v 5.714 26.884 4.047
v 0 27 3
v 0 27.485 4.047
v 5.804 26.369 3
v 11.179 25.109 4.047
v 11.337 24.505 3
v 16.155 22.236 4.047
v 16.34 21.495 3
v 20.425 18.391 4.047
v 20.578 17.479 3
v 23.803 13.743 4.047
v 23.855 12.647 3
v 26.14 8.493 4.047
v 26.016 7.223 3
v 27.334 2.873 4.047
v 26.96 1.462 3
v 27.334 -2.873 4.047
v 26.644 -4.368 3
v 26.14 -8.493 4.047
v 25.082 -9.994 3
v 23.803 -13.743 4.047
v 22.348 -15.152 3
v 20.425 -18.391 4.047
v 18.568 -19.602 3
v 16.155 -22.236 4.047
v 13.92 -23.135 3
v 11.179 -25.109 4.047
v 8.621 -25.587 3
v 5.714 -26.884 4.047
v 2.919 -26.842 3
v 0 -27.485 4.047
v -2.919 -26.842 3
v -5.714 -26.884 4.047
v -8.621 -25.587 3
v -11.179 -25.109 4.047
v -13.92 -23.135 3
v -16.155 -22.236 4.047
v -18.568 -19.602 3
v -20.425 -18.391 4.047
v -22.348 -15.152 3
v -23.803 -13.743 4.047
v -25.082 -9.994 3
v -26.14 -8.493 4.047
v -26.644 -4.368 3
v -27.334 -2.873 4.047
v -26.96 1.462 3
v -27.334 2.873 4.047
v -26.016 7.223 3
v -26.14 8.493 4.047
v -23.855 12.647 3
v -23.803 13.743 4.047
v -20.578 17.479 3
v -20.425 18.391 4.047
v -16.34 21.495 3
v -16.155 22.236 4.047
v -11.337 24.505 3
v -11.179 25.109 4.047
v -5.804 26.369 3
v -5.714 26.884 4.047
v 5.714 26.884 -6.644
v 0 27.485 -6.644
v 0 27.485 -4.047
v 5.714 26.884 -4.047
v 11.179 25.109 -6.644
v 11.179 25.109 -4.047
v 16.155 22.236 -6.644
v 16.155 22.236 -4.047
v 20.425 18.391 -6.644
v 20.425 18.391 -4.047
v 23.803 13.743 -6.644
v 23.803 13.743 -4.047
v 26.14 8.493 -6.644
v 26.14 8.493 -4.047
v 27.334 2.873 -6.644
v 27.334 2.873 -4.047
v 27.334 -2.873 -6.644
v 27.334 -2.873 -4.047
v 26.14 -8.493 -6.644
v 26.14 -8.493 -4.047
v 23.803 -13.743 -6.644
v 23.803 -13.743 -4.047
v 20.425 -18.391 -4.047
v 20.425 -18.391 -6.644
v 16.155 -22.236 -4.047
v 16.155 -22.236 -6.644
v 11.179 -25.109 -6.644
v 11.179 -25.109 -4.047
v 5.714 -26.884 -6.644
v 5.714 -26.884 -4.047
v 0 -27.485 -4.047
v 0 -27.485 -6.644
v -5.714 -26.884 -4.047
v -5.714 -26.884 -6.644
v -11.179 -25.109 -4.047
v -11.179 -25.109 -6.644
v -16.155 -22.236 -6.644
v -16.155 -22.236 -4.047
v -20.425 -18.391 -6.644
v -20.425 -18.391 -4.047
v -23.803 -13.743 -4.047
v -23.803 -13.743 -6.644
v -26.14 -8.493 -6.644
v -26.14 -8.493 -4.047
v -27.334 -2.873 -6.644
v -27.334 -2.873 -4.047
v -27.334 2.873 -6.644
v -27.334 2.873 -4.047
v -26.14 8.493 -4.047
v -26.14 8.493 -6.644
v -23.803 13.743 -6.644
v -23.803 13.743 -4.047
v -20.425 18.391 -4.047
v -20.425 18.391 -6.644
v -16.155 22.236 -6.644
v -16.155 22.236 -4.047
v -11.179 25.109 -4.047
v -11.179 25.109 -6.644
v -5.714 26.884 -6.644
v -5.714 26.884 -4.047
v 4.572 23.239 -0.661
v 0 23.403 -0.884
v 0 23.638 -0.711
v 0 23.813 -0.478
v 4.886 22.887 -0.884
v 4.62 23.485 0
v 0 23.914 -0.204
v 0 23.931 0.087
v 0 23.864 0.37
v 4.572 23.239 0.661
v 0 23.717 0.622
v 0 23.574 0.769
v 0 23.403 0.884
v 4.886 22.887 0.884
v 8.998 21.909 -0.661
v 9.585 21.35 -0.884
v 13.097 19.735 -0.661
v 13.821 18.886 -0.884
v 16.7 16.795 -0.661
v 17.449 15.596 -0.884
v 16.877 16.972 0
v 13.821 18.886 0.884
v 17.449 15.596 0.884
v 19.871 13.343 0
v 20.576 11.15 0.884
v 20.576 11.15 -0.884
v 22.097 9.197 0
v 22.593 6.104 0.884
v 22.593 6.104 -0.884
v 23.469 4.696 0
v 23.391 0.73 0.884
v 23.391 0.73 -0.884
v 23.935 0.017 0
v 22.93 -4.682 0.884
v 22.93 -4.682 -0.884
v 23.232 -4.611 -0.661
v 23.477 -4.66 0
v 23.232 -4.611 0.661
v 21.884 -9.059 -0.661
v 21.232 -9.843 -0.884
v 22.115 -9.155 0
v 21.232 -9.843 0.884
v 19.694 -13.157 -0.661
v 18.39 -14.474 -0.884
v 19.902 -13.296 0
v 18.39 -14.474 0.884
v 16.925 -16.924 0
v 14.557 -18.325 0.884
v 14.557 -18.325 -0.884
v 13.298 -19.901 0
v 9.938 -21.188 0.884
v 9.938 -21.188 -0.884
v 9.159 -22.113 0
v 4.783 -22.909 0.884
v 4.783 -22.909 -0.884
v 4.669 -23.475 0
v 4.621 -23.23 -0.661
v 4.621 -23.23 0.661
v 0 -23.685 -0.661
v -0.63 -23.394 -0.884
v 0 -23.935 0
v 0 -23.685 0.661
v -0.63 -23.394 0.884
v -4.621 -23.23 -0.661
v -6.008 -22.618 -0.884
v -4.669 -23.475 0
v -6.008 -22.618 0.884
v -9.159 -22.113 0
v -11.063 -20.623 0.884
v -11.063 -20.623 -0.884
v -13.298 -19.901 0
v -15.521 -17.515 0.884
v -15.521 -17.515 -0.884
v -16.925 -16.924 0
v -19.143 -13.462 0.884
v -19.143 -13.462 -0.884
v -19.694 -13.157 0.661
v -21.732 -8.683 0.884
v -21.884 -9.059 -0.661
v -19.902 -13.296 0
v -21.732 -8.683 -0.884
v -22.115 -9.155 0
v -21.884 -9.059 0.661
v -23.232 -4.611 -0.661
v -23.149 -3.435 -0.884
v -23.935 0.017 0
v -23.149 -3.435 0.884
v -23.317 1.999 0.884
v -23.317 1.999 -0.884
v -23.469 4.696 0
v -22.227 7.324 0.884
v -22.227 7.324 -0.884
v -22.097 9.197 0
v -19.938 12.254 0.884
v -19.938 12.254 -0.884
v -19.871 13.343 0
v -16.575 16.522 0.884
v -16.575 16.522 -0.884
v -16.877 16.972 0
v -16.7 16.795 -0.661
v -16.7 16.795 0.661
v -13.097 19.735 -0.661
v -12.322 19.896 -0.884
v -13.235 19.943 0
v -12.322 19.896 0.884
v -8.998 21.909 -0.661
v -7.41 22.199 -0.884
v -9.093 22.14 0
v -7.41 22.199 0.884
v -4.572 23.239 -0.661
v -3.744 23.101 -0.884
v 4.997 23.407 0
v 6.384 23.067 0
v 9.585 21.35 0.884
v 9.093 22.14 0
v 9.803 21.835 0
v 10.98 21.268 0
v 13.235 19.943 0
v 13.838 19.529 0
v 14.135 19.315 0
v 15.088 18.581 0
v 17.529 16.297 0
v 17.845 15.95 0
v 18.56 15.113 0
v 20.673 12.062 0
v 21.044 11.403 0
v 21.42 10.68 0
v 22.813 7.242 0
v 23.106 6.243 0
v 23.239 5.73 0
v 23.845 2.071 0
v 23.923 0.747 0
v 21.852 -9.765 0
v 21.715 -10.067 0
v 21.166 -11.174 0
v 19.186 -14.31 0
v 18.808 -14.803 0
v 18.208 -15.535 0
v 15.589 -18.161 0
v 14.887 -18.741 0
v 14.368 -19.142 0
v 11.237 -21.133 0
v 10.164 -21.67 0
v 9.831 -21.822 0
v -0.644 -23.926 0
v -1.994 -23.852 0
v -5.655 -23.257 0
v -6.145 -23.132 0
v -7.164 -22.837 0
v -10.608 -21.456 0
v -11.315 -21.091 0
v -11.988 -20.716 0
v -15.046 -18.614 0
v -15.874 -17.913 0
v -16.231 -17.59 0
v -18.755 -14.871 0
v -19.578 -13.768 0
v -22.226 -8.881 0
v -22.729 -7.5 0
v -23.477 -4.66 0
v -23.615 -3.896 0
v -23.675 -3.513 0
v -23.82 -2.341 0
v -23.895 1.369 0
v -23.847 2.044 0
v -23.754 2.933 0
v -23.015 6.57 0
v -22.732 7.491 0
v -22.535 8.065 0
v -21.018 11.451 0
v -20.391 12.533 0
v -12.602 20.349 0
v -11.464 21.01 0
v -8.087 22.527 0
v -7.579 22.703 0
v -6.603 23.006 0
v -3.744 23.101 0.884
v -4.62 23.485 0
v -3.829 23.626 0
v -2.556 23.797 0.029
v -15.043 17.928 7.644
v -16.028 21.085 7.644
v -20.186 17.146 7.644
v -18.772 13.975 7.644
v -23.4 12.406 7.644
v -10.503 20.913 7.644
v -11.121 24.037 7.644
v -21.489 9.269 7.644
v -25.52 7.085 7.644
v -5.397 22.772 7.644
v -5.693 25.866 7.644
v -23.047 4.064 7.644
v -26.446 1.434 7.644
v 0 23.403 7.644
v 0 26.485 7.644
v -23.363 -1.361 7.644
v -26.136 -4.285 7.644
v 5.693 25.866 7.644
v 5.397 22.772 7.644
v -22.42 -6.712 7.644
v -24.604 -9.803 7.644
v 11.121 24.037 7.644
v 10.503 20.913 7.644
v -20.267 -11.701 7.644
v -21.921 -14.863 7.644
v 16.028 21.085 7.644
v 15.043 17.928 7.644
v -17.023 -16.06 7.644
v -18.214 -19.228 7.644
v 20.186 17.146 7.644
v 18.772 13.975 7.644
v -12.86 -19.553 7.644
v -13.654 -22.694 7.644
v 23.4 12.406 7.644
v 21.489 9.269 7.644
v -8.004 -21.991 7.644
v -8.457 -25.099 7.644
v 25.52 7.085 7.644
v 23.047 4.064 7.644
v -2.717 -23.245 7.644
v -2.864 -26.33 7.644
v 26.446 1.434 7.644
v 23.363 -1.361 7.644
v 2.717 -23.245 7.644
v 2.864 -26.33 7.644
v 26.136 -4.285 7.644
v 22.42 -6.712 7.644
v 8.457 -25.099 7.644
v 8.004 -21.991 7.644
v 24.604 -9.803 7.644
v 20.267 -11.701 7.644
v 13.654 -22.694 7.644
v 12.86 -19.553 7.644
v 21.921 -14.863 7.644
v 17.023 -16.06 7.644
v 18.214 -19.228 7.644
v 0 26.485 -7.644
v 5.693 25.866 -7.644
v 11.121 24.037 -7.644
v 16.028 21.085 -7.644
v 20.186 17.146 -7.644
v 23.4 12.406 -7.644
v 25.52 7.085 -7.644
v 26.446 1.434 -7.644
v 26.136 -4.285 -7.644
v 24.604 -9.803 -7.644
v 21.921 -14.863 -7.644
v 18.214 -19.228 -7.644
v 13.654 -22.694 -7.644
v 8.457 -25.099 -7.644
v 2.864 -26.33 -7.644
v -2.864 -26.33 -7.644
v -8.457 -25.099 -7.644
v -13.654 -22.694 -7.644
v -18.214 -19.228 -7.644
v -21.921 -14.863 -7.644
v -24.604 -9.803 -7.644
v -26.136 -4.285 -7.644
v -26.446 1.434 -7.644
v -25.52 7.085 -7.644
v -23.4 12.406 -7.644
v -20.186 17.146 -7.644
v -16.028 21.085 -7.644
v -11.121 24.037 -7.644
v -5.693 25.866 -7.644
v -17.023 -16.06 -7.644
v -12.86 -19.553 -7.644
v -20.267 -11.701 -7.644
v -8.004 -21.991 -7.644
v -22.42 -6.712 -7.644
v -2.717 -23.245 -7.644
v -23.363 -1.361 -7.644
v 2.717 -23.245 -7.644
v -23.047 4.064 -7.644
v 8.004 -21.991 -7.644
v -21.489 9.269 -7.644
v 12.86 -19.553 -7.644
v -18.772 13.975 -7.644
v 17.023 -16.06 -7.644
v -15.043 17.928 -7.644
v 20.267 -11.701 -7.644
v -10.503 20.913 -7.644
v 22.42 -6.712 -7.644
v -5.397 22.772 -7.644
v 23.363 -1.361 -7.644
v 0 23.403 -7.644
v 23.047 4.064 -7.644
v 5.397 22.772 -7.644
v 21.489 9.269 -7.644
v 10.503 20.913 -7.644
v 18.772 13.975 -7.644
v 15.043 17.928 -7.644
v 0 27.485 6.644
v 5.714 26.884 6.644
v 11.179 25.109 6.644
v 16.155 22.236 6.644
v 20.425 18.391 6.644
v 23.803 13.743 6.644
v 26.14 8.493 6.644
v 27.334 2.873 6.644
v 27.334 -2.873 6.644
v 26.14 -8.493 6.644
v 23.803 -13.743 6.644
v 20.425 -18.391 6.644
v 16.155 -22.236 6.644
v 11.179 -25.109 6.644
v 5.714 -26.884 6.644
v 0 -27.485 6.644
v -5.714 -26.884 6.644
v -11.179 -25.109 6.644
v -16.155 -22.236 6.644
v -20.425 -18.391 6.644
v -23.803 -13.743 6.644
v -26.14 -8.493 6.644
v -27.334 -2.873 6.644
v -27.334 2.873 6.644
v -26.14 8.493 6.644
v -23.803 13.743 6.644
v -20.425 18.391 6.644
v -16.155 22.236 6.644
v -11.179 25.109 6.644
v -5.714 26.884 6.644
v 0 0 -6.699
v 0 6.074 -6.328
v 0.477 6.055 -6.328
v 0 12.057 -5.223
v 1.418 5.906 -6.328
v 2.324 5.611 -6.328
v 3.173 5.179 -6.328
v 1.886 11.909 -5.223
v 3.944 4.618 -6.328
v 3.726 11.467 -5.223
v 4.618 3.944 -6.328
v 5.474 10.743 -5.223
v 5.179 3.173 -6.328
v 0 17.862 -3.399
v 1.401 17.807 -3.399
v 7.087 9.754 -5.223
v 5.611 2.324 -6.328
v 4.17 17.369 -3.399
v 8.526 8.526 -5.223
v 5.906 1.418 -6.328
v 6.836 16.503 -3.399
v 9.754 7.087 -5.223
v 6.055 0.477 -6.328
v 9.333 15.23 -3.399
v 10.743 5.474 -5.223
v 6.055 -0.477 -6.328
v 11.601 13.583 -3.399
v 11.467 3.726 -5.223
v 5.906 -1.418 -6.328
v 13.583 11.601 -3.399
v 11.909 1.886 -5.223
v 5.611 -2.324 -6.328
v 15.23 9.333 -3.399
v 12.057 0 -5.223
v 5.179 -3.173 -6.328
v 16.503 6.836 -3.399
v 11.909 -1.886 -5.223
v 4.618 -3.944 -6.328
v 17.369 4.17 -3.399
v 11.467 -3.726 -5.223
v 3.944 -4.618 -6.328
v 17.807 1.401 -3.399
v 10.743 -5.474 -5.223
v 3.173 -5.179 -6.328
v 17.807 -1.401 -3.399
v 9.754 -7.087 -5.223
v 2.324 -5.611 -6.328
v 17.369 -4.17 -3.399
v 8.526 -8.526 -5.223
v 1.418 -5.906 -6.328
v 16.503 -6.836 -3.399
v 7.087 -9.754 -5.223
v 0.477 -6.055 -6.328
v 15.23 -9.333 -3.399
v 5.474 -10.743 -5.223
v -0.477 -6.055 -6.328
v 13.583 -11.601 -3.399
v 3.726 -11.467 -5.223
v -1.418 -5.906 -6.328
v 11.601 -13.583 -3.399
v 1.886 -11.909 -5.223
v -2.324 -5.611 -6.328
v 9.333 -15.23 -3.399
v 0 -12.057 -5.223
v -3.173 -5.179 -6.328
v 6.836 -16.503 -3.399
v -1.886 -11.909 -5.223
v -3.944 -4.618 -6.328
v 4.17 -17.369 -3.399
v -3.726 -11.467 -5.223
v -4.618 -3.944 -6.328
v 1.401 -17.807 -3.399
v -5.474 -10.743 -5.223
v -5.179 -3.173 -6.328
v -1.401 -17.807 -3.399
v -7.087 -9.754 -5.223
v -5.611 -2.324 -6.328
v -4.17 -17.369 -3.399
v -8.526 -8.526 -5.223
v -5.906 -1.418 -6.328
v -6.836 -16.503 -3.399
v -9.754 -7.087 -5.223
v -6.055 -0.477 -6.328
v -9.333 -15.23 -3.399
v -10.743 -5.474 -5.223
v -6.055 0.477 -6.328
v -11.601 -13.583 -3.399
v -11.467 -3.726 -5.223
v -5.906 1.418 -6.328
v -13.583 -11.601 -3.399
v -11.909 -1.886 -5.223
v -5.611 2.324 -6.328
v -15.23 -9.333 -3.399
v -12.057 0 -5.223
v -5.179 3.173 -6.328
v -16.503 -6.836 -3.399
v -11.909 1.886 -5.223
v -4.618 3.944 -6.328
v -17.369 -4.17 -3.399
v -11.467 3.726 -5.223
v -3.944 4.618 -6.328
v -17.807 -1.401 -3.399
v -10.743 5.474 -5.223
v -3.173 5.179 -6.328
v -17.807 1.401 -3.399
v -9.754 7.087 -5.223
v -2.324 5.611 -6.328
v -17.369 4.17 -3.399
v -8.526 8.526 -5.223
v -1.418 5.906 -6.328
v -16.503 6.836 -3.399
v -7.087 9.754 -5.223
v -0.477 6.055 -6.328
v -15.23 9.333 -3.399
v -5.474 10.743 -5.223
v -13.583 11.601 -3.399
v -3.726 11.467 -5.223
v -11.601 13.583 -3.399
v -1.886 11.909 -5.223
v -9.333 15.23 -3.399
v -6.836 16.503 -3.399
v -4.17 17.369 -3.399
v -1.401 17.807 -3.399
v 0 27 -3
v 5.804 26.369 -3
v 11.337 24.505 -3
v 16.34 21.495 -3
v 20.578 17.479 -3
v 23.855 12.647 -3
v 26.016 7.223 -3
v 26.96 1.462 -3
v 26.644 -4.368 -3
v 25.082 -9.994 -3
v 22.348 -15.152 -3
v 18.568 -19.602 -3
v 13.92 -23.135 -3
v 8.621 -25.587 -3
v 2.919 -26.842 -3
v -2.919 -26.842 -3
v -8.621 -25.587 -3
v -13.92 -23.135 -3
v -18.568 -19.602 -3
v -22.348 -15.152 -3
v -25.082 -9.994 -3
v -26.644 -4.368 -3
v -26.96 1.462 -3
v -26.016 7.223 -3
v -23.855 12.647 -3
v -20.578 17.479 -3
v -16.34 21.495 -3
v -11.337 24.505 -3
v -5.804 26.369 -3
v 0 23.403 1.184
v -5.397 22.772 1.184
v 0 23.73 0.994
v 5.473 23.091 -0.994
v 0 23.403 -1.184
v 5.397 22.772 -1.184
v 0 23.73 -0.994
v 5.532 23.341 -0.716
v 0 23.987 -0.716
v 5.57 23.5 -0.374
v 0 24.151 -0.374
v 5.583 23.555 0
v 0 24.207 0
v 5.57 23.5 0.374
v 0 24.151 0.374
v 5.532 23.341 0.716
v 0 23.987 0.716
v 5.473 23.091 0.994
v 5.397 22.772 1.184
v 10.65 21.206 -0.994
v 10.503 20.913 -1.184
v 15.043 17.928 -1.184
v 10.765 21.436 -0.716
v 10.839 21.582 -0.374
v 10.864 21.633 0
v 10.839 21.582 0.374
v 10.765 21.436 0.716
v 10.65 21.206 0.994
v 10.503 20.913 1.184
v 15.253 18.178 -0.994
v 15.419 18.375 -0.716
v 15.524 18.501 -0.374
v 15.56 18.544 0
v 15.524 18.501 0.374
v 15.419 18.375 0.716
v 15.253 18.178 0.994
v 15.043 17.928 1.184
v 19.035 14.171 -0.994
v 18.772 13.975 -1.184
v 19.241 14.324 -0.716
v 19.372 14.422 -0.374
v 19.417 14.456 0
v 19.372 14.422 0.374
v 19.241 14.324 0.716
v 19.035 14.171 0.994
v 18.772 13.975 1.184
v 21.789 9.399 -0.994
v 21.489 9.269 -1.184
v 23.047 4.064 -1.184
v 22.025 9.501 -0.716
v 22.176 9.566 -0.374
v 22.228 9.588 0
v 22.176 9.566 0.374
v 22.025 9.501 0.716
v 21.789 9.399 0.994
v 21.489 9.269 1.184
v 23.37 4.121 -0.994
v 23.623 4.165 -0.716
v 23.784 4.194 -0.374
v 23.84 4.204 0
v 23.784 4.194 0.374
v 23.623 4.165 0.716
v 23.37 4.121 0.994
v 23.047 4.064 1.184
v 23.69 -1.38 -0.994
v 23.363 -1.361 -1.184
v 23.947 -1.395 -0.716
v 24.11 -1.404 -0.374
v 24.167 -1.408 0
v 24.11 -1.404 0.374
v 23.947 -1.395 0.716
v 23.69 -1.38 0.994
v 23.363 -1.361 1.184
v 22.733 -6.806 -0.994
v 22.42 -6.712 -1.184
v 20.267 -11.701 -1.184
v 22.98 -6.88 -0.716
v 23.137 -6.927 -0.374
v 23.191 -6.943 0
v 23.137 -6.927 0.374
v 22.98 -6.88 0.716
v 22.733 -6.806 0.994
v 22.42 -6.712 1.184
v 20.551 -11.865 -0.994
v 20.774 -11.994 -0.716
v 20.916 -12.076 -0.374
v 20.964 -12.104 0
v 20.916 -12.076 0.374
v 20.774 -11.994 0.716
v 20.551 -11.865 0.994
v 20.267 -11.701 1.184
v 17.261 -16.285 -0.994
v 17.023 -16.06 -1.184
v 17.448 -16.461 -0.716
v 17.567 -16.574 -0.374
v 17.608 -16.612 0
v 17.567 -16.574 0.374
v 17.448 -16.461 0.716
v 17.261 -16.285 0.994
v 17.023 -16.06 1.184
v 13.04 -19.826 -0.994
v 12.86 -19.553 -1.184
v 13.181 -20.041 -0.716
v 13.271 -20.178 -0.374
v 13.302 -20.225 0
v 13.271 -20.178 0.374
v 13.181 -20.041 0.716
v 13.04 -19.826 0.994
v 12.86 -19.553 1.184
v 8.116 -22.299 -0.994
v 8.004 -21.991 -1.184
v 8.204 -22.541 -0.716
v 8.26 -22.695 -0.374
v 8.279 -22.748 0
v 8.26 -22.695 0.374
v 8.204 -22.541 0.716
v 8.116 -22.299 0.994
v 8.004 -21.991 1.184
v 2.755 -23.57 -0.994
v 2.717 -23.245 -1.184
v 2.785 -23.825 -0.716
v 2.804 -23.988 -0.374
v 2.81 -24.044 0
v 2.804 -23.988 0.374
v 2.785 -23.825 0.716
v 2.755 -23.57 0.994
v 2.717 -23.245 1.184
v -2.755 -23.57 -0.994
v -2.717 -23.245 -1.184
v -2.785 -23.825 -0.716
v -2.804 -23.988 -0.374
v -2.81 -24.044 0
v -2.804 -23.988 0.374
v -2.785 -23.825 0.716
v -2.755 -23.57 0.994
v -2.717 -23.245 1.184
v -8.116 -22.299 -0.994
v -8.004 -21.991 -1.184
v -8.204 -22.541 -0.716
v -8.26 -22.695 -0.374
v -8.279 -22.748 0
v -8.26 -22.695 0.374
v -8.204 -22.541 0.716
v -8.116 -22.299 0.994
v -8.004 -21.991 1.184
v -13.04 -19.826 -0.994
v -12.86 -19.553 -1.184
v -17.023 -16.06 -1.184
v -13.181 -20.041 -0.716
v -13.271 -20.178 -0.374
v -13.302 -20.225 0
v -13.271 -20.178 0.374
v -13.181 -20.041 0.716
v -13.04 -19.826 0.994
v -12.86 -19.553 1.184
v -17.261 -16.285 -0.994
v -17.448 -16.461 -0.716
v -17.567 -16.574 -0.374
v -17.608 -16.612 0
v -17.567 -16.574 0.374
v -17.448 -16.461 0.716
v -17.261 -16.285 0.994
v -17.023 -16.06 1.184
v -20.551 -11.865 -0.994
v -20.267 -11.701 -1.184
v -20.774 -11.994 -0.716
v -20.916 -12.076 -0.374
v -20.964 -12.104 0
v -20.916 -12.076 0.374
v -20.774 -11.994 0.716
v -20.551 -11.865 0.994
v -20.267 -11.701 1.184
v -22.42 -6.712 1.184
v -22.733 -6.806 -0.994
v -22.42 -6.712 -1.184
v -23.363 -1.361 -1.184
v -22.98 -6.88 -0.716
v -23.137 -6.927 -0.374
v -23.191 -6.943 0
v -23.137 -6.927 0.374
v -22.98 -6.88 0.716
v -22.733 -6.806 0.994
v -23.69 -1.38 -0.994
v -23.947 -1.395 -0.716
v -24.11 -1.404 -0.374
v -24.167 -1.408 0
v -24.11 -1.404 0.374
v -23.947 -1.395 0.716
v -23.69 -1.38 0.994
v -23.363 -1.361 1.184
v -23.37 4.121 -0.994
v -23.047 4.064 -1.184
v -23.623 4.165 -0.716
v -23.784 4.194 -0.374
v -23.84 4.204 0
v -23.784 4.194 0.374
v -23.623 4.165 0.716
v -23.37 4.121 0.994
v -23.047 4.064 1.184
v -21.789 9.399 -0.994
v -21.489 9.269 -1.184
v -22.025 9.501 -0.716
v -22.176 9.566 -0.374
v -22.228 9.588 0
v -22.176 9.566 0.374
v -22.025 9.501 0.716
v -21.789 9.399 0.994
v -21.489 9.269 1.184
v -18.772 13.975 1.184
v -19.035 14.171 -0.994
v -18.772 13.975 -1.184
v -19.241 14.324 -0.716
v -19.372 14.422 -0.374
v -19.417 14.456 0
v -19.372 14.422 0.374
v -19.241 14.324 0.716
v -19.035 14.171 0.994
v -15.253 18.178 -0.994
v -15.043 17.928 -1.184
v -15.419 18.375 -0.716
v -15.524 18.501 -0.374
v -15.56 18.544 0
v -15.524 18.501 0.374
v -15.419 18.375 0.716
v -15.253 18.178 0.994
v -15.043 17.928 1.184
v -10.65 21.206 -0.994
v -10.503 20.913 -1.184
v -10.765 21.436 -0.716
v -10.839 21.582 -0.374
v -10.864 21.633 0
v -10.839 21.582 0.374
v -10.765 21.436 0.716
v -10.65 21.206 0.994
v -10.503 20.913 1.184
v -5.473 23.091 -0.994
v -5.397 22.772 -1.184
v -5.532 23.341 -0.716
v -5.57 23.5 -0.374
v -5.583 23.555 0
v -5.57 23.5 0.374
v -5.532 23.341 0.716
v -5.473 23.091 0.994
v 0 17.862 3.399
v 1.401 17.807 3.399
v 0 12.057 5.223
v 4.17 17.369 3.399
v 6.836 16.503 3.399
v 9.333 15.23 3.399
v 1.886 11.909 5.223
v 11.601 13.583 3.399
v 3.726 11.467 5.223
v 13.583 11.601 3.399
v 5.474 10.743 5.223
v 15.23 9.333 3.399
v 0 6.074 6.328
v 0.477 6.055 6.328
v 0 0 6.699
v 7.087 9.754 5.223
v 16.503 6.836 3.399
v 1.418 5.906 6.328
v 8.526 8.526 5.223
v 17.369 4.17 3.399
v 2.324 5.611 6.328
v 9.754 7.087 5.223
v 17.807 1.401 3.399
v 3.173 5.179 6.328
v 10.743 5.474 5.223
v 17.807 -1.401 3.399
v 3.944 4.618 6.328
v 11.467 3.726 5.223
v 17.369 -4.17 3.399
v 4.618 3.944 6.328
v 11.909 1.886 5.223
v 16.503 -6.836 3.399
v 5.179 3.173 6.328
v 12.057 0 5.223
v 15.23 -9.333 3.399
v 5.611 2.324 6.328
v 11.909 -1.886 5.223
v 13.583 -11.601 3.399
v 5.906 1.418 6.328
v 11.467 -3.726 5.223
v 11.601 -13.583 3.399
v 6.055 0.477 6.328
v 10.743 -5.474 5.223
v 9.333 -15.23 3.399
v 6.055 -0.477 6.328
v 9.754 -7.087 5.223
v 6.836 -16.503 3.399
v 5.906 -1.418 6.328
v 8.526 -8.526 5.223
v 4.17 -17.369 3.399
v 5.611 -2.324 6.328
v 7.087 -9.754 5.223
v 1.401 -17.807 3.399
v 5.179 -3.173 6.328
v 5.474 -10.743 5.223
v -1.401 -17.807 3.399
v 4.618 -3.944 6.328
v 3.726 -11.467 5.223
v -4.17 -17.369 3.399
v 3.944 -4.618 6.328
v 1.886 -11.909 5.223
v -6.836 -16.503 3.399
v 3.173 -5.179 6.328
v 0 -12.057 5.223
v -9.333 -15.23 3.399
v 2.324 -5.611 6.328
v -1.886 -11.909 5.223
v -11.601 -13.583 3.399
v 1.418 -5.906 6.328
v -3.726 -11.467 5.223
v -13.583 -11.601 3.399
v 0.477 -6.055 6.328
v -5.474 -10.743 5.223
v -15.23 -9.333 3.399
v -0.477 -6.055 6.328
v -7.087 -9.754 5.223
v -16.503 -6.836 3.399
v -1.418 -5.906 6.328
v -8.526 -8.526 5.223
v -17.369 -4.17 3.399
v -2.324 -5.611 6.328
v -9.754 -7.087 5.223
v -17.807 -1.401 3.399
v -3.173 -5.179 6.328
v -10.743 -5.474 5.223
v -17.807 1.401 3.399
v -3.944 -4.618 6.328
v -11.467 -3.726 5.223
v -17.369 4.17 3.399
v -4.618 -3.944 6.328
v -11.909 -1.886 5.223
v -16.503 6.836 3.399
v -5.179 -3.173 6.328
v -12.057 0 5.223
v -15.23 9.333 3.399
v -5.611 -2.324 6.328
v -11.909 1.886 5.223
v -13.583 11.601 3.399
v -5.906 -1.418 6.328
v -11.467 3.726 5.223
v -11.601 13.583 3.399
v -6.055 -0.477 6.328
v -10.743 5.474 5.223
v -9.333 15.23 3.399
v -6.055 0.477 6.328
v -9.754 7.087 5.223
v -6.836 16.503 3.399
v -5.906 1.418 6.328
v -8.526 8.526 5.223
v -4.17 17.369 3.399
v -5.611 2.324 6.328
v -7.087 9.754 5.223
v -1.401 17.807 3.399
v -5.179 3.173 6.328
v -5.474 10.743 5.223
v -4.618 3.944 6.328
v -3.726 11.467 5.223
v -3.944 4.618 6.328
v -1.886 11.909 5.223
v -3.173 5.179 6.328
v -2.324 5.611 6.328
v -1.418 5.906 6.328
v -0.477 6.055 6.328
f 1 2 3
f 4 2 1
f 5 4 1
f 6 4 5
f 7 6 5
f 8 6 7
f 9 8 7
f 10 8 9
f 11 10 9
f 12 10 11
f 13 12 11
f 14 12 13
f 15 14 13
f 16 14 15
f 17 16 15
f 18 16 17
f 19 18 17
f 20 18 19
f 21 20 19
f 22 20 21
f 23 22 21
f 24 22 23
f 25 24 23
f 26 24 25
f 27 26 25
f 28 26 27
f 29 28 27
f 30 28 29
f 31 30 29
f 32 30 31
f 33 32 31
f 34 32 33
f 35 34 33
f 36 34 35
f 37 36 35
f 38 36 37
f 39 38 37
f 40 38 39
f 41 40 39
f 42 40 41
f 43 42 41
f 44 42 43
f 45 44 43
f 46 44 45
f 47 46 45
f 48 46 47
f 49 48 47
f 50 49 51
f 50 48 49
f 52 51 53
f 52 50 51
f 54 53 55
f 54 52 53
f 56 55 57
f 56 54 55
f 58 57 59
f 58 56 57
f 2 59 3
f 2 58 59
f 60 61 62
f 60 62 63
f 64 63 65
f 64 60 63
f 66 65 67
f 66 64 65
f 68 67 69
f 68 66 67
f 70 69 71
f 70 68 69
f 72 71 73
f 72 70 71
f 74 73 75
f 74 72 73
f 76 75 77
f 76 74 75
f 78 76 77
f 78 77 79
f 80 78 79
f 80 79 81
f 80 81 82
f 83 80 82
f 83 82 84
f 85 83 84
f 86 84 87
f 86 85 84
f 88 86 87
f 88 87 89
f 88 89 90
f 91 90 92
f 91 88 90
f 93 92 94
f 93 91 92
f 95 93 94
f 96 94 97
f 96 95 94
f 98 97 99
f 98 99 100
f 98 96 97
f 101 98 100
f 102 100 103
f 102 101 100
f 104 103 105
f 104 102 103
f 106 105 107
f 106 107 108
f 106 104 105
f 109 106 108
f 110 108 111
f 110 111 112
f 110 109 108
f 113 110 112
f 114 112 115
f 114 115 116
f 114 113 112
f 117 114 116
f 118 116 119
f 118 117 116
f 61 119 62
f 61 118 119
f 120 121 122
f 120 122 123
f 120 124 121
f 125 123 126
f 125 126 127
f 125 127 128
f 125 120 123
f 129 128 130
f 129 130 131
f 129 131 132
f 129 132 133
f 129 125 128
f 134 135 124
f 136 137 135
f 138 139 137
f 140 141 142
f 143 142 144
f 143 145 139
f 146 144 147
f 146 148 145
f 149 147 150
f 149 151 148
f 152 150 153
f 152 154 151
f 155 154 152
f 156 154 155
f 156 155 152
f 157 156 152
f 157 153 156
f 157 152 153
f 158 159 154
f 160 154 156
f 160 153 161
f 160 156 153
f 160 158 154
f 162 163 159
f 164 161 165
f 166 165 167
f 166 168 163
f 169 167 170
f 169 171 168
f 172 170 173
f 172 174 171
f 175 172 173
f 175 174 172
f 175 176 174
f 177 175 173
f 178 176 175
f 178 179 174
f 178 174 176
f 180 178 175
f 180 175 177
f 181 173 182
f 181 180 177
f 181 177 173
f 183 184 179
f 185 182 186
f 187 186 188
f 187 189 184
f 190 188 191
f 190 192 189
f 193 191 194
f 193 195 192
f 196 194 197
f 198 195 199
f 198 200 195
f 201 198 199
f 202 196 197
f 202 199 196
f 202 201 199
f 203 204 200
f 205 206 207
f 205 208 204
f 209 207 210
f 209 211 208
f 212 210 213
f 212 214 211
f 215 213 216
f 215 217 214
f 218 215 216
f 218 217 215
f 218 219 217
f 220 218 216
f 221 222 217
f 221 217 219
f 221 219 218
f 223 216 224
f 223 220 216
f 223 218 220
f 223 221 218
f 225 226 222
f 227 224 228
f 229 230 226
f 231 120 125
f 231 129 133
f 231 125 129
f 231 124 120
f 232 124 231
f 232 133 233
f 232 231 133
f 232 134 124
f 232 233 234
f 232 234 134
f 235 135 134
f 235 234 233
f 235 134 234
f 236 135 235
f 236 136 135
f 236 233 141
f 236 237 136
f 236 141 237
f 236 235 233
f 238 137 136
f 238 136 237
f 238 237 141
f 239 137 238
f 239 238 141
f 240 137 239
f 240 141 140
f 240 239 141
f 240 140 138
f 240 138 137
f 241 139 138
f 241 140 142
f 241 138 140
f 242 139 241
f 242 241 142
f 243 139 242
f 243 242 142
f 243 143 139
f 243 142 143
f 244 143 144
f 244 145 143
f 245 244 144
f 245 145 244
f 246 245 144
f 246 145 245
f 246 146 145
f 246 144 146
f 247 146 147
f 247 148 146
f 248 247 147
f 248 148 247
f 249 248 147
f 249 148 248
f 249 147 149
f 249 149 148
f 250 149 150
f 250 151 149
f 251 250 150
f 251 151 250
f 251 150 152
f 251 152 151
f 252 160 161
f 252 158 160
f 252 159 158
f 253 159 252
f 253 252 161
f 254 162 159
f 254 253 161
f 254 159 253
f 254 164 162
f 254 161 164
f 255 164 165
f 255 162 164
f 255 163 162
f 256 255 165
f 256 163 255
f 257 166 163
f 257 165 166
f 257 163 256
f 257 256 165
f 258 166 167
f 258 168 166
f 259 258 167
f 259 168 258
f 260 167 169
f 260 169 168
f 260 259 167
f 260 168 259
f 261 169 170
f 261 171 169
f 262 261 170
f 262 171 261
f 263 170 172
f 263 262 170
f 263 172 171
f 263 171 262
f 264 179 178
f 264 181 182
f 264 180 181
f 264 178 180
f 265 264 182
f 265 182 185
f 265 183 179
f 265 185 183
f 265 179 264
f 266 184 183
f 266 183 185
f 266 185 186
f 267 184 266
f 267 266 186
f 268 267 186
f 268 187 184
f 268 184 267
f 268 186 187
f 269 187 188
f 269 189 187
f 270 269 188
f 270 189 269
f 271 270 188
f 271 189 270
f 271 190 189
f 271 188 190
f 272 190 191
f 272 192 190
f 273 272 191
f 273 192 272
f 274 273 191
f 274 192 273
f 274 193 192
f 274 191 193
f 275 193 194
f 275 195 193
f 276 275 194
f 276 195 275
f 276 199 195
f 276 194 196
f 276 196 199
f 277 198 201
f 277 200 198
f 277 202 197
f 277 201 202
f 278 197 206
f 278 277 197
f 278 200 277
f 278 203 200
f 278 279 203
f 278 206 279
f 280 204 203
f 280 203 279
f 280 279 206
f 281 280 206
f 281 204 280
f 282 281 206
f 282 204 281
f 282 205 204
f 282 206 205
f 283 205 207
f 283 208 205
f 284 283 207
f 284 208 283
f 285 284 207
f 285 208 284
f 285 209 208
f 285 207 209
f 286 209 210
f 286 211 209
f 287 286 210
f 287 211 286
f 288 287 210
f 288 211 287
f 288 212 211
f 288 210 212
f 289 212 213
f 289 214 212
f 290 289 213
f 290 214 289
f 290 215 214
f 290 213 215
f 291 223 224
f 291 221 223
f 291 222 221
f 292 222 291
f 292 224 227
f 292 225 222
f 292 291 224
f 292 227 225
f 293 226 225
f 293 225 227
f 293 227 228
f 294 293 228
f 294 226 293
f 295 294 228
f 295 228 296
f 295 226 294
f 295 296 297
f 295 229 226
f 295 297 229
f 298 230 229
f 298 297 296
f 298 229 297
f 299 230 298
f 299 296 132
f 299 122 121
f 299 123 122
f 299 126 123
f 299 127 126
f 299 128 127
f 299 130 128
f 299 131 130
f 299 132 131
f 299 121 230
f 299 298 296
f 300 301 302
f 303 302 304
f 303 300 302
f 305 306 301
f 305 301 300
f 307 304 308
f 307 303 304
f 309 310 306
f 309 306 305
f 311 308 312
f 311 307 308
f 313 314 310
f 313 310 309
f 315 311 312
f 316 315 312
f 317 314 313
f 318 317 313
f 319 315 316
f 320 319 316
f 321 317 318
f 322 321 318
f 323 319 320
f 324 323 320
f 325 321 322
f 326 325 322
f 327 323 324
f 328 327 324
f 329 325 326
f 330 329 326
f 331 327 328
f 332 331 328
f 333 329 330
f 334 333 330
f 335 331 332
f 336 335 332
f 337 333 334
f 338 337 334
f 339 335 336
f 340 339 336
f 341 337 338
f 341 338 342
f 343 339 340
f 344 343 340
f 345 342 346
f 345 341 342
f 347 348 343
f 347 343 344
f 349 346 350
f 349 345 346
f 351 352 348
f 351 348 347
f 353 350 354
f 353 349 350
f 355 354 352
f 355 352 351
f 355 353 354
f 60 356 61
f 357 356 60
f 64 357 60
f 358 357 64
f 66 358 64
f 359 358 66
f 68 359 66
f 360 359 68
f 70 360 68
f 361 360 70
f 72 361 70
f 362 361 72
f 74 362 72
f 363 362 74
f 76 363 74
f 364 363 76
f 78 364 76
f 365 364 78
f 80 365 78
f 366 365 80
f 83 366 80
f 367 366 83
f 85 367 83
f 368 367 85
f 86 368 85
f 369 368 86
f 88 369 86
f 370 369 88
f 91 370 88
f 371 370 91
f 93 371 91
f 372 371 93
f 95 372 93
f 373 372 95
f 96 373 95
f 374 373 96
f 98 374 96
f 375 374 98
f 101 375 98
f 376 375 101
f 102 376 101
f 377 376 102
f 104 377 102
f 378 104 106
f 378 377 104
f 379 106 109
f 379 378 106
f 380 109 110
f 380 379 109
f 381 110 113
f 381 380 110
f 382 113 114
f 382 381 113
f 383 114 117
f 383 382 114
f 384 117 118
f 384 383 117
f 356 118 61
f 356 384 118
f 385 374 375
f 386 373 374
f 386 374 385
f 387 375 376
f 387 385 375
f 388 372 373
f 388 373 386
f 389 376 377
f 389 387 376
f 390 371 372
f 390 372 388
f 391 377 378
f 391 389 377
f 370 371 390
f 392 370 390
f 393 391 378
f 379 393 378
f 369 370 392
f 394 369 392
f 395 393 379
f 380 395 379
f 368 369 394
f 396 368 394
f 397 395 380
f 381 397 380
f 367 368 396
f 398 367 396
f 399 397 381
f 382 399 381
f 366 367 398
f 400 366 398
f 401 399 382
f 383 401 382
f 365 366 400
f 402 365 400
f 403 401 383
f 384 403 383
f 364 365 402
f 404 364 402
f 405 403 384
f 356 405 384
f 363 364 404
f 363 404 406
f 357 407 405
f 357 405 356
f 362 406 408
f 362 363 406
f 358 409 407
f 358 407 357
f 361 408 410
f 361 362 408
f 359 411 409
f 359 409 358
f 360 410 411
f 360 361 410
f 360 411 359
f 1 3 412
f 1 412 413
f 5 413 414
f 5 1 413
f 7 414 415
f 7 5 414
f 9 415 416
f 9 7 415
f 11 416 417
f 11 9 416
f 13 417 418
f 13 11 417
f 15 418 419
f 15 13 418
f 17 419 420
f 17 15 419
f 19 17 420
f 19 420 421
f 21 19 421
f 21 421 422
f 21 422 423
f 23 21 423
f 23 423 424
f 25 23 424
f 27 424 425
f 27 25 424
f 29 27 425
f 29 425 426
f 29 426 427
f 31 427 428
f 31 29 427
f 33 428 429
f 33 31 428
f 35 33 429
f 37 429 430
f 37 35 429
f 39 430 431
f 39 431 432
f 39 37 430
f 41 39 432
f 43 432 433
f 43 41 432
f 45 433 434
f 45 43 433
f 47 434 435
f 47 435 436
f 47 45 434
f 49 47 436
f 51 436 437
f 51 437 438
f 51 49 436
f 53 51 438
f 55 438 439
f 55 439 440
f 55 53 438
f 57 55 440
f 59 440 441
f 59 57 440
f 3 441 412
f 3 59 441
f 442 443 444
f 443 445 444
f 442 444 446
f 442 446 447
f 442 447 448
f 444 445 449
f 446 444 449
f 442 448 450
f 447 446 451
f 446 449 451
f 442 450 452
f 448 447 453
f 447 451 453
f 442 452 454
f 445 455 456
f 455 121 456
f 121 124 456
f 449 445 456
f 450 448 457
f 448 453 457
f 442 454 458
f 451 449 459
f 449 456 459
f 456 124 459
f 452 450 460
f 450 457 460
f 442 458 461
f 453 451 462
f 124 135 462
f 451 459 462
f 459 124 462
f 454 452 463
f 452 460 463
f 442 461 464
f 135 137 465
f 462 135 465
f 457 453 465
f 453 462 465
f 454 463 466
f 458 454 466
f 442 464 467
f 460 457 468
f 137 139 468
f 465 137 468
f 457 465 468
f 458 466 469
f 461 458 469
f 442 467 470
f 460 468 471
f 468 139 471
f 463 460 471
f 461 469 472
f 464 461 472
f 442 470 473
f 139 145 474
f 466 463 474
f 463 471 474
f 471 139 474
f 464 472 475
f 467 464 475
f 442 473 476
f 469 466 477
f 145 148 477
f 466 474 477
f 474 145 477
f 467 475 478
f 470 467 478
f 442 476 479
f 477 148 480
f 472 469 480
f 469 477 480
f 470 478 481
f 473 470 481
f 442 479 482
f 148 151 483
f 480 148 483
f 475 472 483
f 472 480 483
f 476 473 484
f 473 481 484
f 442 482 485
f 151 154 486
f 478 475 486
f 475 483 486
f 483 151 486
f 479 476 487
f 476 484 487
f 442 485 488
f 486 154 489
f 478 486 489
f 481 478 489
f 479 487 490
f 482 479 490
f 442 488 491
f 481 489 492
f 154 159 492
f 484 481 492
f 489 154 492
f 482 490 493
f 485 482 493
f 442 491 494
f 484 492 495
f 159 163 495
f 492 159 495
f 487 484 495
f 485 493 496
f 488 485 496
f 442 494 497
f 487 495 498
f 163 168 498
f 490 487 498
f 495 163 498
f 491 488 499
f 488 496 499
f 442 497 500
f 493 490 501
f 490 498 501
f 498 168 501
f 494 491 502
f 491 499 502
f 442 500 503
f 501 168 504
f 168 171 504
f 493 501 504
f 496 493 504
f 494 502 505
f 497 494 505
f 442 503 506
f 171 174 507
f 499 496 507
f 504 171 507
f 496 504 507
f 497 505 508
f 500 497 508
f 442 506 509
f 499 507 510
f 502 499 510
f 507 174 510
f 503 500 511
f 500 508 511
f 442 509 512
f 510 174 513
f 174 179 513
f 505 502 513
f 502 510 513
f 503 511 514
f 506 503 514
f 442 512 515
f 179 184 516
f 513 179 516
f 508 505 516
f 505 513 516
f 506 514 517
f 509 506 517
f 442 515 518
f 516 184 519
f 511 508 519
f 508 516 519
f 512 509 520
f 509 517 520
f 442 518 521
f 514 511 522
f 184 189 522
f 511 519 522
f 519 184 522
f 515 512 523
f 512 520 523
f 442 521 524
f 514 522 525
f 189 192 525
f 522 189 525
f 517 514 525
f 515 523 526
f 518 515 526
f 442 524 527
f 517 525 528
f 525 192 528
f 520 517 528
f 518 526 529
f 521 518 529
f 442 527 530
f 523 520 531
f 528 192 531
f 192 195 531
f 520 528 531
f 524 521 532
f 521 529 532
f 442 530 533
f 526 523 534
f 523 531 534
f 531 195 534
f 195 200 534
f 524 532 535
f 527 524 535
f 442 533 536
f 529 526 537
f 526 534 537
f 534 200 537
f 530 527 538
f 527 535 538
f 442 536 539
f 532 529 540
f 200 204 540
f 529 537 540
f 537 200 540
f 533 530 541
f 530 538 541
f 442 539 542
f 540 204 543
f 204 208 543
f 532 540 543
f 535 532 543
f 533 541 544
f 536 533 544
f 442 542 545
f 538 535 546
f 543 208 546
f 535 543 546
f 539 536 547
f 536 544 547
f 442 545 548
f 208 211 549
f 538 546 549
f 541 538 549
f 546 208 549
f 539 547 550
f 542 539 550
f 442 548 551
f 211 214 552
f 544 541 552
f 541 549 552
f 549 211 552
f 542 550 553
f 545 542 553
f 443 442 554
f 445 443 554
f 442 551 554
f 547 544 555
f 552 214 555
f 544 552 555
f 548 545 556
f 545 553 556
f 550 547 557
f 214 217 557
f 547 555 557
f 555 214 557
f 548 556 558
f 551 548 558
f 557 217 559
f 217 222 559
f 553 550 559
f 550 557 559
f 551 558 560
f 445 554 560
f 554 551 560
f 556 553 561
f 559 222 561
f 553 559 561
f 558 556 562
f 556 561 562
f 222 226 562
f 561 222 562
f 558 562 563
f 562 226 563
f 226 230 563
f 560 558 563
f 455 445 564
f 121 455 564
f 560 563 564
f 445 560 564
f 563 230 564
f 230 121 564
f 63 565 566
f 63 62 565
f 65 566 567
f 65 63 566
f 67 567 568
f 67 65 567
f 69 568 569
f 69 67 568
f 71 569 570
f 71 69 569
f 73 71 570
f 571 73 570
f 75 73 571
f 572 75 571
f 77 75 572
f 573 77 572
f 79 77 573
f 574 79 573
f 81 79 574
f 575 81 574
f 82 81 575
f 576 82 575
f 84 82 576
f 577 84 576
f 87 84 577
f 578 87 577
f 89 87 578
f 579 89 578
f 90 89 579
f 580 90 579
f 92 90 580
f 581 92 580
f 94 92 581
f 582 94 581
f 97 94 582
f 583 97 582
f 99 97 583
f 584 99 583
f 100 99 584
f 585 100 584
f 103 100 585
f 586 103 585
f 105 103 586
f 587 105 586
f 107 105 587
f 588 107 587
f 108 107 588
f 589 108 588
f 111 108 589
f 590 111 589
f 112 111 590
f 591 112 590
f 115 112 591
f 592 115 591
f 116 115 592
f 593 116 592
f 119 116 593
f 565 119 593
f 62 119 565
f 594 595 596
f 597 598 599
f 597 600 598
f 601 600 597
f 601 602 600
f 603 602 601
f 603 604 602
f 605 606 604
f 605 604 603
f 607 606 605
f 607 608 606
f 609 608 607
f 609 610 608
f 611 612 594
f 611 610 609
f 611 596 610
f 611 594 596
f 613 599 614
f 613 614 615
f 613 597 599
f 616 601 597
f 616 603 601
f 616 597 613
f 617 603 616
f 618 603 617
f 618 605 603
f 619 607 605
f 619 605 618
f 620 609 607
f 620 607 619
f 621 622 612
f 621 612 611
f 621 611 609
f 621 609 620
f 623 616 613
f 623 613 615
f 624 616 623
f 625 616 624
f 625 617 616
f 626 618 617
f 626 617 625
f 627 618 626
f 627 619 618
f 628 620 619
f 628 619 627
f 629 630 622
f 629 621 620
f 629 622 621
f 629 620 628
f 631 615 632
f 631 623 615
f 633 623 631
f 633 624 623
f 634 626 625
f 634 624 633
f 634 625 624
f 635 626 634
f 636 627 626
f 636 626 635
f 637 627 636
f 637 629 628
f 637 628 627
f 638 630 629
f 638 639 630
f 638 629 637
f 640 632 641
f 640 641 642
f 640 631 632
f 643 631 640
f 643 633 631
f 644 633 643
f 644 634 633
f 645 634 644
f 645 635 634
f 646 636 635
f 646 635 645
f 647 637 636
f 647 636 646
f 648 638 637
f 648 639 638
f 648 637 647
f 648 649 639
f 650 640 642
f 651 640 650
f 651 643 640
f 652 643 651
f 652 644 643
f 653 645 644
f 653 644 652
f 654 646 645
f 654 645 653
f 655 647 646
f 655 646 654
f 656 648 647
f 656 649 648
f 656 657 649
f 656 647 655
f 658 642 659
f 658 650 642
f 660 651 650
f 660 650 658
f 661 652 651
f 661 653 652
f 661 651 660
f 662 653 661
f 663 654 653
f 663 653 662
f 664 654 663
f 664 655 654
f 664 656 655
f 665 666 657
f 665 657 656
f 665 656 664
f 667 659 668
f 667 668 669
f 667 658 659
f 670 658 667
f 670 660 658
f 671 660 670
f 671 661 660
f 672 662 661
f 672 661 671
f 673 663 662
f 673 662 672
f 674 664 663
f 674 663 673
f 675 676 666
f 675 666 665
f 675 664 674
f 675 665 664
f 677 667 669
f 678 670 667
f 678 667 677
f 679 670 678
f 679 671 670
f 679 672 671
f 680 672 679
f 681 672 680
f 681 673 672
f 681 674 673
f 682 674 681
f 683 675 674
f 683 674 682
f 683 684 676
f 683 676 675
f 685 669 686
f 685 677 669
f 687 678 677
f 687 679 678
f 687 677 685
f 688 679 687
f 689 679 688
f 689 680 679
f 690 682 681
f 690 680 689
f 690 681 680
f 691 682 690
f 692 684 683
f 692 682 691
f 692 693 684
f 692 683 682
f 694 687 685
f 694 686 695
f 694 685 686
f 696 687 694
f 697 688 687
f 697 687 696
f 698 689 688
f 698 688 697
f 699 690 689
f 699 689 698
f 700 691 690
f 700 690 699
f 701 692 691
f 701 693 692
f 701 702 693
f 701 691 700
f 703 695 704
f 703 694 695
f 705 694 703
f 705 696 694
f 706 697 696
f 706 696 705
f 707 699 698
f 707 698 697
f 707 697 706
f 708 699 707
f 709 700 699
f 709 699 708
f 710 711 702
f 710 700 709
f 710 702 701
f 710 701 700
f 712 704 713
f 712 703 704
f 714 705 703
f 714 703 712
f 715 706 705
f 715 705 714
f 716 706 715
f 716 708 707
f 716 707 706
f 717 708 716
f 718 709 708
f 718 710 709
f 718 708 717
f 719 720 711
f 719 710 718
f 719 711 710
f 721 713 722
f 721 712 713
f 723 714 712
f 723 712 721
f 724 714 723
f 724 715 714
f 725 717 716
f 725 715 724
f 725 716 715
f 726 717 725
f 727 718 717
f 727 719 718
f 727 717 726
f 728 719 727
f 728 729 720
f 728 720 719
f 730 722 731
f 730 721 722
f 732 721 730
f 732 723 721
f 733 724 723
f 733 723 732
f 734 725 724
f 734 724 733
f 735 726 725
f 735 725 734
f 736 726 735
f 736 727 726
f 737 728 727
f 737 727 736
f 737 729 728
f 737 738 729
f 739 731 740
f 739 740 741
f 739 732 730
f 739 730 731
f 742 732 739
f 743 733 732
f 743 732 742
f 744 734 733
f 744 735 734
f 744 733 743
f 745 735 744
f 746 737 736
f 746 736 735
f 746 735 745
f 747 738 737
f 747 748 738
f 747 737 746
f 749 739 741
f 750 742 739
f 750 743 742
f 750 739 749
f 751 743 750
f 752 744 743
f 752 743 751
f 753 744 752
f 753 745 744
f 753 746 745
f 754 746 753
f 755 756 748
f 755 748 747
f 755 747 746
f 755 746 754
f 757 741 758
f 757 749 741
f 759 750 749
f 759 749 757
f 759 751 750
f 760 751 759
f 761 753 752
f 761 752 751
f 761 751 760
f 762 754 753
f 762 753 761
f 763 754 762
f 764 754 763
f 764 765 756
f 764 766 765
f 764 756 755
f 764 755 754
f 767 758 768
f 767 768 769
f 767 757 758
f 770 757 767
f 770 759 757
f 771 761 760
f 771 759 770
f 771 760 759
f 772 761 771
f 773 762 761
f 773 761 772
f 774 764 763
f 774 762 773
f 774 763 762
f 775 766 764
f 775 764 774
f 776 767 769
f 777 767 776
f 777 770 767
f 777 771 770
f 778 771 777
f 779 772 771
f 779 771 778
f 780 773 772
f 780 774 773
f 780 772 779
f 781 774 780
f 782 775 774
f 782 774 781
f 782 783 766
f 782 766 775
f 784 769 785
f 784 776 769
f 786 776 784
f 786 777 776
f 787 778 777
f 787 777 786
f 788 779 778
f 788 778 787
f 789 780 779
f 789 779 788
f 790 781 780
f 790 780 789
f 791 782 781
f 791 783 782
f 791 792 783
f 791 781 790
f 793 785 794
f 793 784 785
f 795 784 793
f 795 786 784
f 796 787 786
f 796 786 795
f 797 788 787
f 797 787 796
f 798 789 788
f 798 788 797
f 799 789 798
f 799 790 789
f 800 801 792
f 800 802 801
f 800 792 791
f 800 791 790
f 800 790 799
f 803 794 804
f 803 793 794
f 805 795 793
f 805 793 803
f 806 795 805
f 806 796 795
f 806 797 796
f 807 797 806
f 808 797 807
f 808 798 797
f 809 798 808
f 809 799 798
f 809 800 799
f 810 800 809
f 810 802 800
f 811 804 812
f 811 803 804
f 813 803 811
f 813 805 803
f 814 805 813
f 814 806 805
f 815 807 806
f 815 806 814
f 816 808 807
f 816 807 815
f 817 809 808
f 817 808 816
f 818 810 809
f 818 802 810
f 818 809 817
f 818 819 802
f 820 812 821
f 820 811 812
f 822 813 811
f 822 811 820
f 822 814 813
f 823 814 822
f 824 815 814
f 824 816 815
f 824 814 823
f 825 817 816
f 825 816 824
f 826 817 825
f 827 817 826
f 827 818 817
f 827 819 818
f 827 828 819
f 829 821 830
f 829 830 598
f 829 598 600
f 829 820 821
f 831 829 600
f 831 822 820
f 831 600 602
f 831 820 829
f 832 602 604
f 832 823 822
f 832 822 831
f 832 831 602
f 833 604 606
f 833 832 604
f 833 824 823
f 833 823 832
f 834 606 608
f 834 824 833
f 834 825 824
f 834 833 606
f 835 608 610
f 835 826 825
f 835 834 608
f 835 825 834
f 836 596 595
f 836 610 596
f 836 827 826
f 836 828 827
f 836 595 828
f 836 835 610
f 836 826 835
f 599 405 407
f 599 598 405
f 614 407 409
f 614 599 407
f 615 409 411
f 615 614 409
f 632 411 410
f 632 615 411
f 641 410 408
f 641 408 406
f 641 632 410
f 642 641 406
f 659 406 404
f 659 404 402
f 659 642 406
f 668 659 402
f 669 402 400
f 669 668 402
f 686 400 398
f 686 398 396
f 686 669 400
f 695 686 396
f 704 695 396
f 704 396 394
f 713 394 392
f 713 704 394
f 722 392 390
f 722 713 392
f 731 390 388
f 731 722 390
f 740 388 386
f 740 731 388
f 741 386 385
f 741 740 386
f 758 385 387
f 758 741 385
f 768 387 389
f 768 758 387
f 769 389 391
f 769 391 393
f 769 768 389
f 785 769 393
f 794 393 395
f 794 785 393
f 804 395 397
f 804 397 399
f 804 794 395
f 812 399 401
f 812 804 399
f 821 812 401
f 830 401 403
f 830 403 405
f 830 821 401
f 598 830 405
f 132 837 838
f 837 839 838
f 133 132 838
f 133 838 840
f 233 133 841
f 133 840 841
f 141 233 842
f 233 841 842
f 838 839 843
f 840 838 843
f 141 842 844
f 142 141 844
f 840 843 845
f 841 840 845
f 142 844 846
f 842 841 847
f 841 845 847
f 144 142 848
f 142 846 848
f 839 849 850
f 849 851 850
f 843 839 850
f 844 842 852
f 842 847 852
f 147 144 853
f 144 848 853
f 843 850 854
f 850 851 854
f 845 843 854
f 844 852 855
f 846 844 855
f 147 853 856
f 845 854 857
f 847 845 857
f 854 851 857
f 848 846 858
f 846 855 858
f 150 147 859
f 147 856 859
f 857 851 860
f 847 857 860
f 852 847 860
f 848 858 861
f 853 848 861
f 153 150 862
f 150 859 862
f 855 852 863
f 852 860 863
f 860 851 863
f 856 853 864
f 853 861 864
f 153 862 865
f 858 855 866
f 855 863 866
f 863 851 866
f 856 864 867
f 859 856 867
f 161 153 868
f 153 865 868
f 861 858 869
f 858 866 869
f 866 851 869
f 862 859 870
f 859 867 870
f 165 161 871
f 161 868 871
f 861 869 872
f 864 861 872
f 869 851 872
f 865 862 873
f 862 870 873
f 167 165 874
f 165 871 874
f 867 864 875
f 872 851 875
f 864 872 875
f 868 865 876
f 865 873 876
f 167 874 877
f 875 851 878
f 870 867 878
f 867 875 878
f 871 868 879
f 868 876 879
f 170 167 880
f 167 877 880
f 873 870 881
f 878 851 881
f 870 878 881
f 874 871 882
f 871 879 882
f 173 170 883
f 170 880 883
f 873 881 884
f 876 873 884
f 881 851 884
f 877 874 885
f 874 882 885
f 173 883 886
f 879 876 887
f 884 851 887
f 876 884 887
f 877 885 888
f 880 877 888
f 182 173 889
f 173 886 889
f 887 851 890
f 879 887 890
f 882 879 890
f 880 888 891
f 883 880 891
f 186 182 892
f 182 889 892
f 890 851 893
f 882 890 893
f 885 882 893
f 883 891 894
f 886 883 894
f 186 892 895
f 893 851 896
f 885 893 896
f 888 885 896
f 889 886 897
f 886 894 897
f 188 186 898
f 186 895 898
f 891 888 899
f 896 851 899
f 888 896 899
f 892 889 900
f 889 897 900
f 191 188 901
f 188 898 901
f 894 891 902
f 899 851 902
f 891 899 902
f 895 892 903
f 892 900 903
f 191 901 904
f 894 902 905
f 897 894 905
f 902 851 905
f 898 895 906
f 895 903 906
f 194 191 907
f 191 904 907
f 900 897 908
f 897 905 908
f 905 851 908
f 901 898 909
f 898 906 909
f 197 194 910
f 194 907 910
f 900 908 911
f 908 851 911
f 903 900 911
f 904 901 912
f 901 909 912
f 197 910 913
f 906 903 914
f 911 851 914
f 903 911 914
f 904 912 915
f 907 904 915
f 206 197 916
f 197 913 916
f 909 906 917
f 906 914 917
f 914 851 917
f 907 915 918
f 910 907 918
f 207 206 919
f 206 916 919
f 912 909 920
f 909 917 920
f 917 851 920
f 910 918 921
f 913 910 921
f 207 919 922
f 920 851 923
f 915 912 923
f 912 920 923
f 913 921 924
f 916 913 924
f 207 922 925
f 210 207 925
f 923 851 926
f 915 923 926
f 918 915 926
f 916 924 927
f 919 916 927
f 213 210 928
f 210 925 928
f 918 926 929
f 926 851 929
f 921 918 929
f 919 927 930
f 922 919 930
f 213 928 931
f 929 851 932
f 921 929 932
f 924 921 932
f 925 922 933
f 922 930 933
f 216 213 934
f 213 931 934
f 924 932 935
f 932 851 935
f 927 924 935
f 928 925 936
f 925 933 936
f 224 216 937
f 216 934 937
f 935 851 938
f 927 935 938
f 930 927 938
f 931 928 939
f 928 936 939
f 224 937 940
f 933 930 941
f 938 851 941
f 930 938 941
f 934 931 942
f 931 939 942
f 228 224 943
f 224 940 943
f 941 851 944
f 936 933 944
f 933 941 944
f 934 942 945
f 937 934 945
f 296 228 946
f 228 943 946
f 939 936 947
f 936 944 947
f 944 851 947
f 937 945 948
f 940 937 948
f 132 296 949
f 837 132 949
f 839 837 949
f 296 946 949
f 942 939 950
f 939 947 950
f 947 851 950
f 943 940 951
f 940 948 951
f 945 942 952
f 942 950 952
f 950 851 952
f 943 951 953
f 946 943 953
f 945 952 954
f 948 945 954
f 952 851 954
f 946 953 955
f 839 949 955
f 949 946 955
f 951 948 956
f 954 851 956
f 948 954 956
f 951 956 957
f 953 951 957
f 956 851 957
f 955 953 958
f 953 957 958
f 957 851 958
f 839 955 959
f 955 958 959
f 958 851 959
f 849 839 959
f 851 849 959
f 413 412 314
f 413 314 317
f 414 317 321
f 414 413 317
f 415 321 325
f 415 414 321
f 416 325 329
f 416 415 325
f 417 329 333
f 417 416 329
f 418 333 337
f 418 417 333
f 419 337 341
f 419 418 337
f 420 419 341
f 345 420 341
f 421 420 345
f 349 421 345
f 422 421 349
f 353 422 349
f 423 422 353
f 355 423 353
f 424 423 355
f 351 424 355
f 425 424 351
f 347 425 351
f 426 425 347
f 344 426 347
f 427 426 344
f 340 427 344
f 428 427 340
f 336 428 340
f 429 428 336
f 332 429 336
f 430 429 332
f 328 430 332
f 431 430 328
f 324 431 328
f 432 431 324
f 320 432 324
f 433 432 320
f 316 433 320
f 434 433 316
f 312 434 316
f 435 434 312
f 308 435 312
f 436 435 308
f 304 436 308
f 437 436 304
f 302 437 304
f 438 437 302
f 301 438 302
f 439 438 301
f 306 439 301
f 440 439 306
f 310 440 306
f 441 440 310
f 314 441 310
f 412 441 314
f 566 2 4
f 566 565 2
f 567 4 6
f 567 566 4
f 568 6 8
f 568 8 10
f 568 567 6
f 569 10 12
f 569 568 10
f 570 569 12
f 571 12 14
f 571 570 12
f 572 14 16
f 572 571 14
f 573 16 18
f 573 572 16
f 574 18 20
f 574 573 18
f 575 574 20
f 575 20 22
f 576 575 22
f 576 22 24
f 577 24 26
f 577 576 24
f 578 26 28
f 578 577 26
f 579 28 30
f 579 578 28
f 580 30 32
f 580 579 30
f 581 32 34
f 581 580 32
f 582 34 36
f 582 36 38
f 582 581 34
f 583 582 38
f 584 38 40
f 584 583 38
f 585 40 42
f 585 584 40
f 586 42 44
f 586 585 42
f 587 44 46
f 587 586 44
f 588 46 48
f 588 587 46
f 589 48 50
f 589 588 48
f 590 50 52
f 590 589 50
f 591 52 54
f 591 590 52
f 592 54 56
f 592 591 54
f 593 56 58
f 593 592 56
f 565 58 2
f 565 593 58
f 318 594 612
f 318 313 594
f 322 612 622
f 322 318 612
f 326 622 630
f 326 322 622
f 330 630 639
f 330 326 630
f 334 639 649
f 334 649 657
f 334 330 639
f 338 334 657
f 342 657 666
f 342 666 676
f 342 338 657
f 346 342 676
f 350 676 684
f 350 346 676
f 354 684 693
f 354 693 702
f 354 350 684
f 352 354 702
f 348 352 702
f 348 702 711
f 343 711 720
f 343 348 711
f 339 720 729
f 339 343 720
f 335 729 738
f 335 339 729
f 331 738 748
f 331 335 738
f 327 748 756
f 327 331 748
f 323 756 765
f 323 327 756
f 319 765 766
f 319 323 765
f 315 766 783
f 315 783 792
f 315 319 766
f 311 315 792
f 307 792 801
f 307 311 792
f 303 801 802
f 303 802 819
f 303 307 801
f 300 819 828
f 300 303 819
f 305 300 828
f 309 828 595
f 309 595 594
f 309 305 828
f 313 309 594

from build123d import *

# Parameters (mm, degrees)
FILLET1_R     = 1
CHAMFER1_SIZE = 1


with BuildPart() as part:
    # Sketch1 → Revolve3 (revolve)
    with BuildSketch(Plane(origin=(0, 0, 0), x_dir=(0, 0, -1), z_dir=(1, 0, 0))):
        with BuildLine():
            Line((-6.698729811, 0), (6.698729811, 0))
            ThreePointArc((6.698729811, 0), (4.995021125, 12.940952255), (0, 25))
            ThreePointArc((0, 25), (-4.995021125, 12.940952255), (-6.698729811, 0))
        make_face()
    revolve(axis=Axis((0, 0, 86.575961886), (0, 0, -1)))

    # Fillet1
    fillet1_edges = [part.edges().sort_by_distance(p)[0] for p in [
        (0, -25, 0),
    ]]
    fillet(fillet1_edges, radius=FILLET1_R)


with BuildPart() as body_2:
    # Sketch2 → Revolve5 (revolve)
    with BuildSketch(Plane(origin=(0, 0, 0), x_dir=(0, 0, -1), z_dir=(1, 0, 0))):
        with BuildLine():
            Line((-1.183594451, 23.402744778), (-7.644169322, 23.402744778))
            Line((-7.644169322, 23.402744778), (-7.644169322, 27.485014913))
            Line((-7.644169322, 27.485014913), (-4.046690664, 27.485014913))
            Line((-4.046690664, 27.485014913), (-3, 27))
            Line((-3, 27), (3, 27))
            Line((3, 27), (4.046690664, 27.485014913))
            Line((4.046690664, 27.485014913), (7.644169322, 27.485014913))
            Line((7.644169322, 27.485014913), (7.644169322, 23.402744778))
            Line((7.644169322, 23.402744778), (1.183594451, 23.402744778))
            ThreePointArc((1.183594451, 23.402744778), (0, 24.207470779), (-1.183594451, 23.402744778))
        make_face()
    revolve(axis=Axis((0, 0, 0), (0, 0, -1)))

    # Chamfer1
    chamfer1_edges = [body_2.edges().sort_by_distance(p)[0] for p in [
        (0, -27.485014913, 7.644169322),
        (0, -27.485014913, -7.644169322),
    ]]
    chamfer(chamfer1_edges, length=CHAMFER1_SIZE)


solid = Compound([part.part, body_2.part])
